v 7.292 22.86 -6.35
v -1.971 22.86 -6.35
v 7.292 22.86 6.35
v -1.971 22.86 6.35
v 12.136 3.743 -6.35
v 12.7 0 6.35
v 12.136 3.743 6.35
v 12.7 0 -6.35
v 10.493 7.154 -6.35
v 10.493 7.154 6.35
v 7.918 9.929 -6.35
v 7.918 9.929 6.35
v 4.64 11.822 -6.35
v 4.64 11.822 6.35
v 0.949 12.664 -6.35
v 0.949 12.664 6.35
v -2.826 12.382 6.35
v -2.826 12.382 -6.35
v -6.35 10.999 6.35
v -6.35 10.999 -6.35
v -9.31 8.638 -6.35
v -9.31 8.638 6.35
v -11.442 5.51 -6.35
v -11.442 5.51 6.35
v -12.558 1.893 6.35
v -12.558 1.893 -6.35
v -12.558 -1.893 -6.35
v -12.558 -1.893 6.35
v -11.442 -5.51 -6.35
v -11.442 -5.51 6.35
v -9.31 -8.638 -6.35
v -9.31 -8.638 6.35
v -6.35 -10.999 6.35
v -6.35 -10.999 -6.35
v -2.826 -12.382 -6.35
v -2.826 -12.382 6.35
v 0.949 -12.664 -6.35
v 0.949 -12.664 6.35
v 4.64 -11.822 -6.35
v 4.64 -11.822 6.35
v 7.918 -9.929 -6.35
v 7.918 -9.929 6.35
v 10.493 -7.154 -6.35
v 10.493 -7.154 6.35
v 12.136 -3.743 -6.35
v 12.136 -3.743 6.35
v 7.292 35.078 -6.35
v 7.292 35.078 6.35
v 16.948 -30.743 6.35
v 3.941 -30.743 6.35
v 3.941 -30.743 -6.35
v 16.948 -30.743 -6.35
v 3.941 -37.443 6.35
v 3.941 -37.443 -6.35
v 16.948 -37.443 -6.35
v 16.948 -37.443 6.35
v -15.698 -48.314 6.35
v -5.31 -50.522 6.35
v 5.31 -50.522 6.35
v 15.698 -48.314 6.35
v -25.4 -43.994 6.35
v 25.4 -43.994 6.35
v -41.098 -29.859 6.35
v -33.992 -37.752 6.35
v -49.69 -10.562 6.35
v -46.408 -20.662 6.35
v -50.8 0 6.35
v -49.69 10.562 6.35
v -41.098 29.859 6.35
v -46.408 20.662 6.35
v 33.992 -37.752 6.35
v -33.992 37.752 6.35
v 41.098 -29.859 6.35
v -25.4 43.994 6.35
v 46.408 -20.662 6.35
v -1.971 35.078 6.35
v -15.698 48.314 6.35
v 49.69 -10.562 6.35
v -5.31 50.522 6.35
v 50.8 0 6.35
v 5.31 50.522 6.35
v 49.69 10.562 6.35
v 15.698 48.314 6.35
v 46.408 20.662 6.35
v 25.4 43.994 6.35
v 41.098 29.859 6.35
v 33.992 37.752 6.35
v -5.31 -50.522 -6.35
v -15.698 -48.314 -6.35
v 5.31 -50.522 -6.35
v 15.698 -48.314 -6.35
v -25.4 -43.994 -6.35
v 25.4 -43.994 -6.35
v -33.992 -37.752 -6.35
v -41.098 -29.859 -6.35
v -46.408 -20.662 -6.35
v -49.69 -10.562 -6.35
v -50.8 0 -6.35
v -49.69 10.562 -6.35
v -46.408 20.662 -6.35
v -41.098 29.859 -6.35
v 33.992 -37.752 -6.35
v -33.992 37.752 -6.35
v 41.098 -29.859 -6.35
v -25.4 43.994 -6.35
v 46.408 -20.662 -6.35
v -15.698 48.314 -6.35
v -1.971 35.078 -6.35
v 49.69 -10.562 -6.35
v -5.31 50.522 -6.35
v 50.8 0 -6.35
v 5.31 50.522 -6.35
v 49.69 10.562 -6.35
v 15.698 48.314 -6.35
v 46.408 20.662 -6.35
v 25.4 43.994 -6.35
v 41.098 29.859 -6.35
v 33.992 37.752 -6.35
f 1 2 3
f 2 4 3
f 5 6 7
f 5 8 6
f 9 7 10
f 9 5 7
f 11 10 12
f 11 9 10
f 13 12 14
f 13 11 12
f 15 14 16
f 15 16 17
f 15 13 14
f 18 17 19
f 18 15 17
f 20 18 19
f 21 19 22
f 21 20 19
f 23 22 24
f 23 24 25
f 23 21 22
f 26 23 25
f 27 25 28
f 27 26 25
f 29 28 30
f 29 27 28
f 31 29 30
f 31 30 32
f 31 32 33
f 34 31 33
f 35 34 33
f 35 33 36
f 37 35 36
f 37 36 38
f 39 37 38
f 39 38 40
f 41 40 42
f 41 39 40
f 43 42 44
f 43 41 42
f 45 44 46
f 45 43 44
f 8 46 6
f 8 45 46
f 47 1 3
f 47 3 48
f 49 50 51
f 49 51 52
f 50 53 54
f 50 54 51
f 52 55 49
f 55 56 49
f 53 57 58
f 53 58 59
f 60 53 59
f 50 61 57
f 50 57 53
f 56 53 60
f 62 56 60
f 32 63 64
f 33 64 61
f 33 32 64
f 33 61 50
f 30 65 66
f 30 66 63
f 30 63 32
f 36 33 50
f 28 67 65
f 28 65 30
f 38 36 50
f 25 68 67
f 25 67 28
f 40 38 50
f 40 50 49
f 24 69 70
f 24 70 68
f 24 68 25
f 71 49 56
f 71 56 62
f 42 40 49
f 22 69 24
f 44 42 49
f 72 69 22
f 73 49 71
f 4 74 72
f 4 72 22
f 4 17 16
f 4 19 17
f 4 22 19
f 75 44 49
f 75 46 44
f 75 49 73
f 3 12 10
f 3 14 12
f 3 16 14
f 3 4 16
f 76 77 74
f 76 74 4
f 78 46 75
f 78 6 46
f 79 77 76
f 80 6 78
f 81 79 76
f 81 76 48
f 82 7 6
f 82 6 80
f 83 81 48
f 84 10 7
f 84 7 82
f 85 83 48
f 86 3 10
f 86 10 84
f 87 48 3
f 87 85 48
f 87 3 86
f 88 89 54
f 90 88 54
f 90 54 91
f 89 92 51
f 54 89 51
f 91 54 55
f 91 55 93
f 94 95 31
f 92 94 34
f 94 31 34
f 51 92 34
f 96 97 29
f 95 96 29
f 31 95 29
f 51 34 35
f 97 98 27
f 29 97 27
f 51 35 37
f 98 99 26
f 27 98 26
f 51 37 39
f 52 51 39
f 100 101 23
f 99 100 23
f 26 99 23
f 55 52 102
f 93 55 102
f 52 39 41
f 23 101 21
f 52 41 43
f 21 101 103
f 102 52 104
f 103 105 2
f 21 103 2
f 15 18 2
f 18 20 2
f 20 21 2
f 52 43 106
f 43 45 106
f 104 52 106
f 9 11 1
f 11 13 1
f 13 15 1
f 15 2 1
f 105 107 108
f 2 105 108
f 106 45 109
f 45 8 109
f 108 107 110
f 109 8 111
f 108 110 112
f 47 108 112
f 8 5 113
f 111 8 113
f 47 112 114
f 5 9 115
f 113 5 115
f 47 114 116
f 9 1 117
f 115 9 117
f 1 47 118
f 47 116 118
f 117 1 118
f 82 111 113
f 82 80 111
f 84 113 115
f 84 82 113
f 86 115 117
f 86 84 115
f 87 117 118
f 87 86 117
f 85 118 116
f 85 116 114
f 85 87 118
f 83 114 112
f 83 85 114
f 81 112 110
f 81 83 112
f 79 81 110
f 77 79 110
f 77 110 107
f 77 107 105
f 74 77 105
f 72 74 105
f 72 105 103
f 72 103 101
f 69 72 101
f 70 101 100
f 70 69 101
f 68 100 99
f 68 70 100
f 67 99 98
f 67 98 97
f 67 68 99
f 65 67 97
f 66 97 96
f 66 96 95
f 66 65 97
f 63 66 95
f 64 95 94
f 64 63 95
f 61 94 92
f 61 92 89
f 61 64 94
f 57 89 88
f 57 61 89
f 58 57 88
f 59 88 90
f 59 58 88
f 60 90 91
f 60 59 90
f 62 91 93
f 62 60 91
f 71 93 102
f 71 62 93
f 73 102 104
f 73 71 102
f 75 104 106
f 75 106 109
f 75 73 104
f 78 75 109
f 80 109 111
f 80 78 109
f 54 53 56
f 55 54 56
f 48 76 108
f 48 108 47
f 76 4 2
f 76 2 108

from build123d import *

# Parameters (mm, degrees)
F0_R     = 50.8
F0_R_2   = 12.7
F0_W     = 13.006554
F0_H     = 6.700346
F0_W_2   = 9.262241
F0_H_2   = 12.218274
F1_DEPTH = 6.35


with BuildPart() as f1:
    # F0 (on Top) → F1 (new body, symmetric)
    with BuildSketch(Plane.XY):
        Circle(F0_R)
        Circle(F0_R_2, mode=Mode.SUBTRACT)
        with Locations((10.444656, -34.092932)):
            Rectangle(F0_W, F0_H, mode=Mode.SUBTRACT)
        with Locations((2.66043, 28.969139)):
            Rectangle(F0_W_2, F0_H_2, mode=Mode.SUBTRACT)
    extrude(amount=F1_DEPTH, both=True)


solid = f1.part
